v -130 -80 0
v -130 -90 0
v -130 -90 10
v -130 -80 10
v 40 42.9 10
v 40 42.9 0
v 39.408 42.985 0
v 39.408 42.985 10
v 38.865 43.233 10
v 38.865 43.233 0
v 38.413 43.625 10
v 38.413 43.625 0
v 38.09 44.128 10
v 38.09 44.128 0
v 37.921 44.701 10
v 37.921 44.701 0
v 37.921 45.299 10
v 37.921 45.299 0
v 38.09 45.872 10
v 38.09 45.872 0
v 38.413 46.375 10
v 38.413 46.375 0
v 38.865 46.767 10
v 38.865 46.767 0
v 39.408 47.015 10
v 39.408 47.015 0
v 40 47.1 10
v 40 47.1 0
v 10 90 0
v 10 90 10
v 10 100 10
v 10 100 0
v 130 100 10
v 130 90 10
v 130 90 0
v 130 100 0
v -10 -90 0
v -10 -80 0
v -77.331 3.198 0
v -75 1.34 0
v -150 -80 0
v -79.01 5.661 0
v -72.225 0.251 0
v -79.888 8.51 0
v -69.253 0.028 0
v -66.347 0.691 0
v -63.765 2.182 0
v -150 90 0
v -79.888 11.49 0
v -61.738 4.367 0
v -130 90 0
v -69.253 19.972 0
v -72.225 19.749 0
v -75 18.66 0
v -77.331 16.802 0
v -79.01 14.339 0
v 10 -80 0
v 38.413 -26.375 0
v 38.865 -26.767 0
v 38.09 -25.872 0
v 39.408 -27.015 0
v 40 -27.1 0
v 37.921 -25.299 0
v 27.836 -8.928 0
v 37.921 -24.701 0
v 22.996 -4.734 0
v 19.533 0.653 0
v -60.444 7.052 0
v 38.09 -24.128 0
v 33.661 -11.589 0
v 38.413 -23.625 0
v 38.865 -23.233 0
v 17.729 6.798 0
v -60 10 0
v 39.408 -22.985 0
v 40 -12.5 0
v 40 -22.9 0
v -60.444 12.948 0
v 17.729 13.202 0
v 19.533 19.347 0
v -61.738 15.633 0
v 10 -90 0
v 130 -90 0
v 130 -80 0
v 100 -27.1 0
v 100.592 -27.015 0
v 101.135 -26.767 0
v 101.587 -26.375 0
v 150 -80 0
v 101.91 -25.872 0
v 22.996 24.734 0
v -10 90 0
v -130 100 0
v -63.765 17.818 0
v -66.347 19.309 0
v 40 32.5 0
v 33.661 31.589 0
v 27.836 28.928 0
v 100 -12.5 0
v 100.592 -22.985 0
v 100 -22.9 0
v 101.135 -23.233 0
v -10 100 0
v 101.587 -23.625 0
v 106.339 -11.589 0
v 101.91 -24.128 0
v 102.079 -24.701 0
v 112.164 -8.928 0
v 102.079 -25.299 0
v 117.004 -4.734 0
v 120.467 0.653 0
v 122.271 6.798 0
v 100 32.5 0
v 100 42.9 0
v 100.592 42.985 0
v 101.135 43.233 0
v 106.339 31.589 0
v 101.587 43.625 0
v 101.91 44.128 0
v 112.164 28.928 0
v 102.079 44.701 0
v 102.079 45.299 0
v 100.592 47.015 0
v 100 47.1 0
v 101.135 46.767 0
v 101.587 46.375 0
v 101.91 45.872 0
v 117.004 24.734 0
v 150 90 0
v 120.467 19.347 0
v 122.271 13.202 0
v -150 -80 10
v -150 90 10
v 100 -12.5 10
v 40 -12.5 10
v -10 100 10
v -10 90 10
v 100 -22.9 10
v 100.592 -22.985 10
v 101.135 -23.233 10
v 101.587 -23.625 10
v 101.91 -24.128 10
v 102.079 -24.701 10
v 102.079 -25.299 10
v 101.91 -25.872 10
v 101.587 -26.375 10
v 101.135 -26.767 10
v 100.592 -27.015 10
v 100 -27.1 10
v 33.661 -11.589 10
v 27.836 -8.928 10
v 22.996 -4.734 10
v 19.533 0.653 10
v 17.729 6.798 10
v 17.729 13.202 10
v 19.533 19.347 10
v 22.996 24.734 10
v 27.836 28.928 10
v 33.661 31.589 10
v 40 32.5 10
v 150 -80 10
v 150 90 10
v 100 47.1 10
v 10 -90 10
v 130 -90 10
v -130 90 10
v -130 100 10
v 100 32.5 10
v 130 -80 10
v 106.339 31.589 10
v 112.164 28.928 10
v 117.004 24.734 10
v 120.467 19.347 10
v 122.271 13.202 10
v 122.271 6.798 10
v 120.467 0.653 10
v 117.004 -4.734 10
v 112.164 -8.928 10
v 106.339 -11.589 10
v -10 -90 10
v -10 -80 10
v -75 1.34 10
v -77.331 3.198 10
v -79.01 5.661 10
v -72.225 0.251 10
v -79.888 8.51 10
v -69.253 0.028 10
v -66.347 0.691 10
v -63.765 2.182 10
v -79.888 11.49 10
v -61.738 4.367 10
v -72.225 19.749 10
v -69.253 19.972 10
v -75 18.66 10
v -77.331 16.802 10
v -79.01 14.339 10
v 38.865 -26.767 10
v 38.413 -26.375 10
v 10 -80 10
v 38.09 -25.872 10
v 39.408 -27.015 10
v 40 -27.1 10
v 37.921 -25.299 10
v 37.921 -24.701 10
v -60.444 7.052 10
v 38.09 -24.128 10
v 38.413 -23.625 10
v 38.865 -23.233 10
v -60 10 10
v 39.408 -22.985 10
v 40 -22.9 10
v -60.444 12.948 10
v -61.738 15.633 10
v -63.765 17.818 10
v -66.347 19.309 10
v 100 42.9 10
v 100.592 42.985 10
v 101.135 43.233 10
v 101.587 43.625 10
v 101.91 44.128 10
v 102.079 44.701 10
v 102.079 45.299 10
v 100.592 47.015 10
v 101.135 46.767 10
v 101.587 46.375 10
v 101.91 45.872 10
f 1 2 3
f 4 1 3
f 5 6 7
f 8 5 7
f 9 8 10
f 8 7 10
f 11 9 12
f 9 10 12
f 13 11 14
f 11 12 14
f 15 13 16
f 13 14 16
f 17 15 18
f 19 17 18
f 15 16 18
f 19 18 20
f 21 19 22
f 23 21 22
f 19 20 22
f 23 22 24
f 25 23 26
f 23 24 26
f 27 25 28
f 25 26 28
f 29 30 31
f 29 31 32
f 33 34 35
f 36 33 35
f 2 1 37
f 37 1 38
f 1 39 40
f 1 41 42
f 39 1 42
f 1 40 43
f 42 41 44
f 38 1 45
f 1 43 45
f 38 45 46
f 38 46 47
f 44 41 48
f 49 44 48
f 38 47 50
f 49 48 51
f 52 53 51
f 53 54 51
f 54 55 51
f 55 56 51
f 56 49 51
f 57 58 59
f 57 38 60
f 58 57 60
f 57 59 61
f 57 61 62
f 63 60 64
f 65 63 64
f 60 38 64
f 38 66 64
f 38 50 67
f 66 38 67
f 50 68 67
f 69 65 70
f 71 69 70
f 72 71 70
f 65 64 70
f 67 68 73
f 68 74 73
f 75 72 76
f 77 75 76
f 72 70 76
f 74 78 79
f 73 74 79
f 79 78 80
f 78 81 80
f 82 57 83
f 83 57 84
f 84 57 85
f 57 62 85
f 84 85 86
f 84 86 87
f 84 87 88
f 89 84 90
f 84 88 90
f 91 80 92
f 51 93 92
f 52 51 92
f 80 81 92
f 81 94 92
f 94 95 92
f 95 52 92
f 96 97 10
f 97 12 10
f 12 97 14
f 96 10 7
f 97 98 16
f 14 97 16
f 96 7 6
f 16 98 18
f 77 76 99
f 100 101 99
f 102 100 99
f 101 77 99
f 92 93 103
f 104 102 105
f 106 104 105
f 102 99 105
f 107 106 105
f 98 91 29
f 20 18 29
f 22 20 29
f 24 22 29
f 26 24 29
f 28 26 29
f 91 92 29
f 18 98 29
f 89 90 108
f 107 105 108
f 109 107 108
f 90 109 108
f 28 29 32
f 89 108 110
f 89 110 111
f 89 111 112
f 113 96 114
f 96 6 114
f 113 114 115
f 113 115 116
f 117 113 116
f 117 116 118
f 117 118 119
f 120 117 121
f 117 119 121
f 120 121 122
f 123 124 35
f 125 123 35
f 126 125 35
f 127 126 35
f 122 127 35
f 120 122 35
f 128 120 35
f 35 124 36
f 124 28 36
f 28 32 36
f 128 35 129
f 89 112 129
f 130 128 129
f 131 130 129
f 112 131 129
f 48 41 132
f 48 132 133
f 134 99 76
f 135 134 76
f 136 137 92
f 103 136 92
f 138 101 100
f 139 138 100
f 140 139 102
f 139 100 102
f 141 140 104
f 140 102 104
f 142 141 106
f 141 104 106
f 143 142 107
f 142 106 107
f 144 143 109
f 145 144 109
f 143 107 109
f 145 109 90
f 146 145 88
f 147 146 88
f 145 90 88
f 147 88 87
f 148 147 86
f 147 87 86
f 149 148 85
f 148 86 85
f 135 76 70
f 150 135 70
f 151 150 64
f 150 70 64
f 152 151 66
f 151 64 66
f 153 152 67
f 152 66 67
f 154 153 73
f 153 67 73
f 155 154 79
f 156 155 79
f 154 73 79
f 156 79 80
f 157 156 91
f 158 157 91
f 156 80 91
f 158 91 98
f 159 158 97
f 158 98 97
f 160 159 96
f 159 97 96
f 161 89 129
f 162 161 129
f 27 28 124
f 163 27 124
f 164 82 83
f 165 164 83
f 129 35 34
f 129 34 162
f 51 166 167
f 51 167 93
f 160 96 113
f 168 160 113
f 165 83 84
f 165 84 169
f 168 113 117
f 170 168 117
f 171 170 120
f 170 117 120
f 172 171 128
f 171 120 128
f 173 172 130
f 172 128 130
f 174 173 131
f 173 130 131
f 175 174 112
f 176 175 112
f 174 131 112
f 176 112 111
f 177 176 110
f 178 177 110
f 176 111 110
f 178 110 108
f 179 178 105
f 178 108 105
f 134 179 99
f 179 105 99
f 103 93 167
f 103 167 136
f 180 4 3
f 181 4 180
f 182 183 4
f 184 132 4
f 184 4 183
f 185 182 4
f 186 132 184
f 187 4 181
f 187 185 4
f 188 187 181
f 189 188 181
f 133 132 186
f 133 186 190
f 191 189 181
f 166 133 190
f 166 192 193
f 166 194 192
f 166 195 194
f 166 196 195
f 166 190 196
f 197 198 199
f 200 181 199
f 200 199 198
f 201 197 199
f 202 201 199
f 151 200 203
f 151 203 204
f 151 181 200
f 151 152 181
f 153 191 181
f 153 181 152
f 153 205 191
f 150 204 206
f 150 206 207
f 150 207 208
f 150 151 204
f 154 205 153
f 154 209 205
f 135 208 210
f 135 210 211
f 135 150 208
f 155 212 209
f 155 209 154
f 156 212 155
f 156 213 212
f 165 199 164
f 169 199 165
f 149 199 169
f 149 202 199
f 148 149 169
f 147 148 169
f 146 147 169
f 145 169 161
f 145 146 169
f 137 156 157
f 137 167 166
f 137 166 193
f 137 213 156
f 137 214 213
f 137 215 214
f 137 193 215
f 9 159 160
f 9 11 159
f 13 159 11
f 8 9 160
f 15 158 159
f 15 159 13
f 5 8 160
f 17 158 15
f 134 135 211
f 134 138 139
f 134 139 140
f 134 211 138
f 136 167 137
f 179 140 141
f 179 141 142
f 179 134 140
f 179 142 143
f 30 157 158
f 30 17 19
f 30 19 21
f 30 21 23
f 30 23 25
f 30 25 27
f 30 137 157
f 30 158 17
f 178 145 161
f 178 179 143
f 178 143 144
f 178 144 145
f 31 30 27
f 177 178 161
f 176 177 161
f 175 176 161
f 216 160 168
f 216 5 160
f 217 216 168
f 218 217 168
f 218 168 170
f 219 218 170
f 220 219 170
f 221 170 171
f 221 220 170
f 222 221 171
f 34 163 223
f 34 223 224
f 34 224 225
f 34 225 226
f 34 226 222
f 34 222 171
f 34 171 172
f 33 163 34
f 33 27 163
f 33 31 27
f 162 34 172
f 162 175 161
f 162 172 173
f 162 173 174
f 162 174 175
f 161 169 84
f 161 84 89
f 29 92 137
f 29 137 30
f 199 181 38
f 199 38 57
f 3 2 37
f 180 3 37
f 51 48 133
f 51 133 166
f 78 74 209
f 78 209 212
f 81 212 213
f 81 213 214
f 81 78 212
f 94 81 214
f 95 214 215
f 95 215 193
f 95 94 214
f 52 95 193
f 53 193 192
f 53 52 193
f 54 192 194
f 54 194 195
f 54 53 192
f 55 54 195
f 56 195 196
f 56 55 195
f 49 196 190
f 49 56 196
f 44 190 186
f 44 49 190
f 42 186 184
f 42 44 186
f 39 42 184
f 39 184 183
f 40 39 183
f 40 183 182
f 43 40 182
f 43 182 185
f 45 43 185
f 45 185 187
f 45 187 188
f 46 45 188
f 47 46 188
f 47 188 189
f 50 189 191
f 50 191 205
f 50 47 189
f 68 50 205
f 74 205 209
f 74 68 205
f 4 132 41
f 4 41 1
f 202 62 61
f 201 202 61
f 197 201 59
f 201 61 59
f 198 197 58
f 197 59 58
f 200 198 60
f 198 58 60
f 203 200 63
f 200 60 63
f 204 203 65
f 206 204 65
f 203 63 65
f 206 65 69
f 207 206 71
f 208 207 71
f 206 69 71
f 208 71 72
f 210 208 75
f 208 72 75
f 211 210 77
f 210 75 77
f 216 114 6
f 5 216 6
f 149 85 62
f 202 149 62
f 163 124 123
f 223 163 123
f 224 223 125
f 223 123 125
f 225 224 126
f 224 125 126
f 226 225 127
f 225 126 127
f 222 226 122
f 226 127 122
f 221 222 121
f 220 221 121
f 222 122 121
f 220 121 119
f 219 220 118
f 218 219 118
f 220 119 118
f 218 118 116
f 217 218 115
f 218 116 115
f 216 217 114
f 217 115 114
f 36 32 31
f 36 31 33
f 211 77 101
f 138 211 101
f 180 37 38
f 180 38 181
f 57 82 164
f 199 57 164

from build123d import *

# Parameters (mm, degrees)
IZIM1_W                     = 300
IZIM1_H                     = 180
IZIM1_R                     = 10
Y_KSEKLIK_EKSTR_ZYON1_DEPTH = 10
IZIM3_W                     = 120
IZIM3_H                     = 10
Y_KSEKLIK_EKSTR_ZYON2_DEPTH = 10
IZIM4_W                     = 20
IZIM4_H                     = 10
KES_EKSTR_ZYON1_DEPTH       = 10


with BuildPart() as part:
    # Çizim1 → Yükseklik-Ekstrüzyon1 (new body)
    with BuildSketch(Plane.XY):
        Rectangle(IZIM1_W, IZIM1_H)
        with Locations((-70, 10)):
            Circle(IZIM1_R, mode=Mode.SUBTRACT)
        with BuildLine():
            Line((100, -12.5), (40, -12.5))
            ThreePointArc((40, -12.5), (17.5, 10), (40, 32.5))
            Line((40, 32.5), (100, 32.5))
            ThreePointArc((100, 32.5), (122.5, 10), (100, -12.5))
        make_face(mode=Mode.SUBTRACT)
        with BuildLine():
            Line((100, 42.9), (40, 42.9))
            ThreePointArc((40, 42.9), (37.9, 45), (40, 47.1))
            Line((40, 47.1), (100, 47.1))
            ThreePointArc((100, 47.1), (102.1, 45), (100, 42.9))
        make_face(mode=Mode.SUBTRACT)
        with BuildLine():
            Line((100, -27.1), (40, -27.1))
            ThreePointArc((40, -27.1), (37.9, -25), (40, -22.9))
            Line((40, -22.9), (100, -22.9))
            ThreePointArc((100, -22.9), (102.1, -25), (100, -27.1))
        make_face(mode=Mode.SUBTRACT)
    extrude(amount=Y_KSEKLIK_EKSTR_ZYON1_DEPTH)

    # Çizim3 → Yükseklik-Ekstrüzyon2 (add)
    with BuildSketch(Plane(origin=(0, 90, 0), x_dir=(1, 0, 0), z_dir=(0, 1, 0))):
        with Locations((70, -5)):
            Rectangle(IZIM3_W, IZIM3_H)
        with Locations((-70, -5)):
            Rectangle(IZIM3_W, IZIM3_H)
    extrude(amount=Y_KSEKLIK_EKSTR_ZYON2_DEPTH)

    # Çizim4 → Kes-Ekstrüzyon1 (cut)
    with BuildSketch(Plane.XZ.offset(90)):
        with Locations((140, 5)):
            Rectangle(IZIM4_W, IZIM4_H)
        with Locations((0, 5)):
            Rectangle(IZIM4_W, IZIM4_H)
        with Locations((-140, 5)):
            Rectangle(IZIM4_W, IZIM4_H)
    extrude(amount=-KES_EKSTR_ZYON1_DEPTH, mode=Mode.SUBTRACT)


solid = part.part
